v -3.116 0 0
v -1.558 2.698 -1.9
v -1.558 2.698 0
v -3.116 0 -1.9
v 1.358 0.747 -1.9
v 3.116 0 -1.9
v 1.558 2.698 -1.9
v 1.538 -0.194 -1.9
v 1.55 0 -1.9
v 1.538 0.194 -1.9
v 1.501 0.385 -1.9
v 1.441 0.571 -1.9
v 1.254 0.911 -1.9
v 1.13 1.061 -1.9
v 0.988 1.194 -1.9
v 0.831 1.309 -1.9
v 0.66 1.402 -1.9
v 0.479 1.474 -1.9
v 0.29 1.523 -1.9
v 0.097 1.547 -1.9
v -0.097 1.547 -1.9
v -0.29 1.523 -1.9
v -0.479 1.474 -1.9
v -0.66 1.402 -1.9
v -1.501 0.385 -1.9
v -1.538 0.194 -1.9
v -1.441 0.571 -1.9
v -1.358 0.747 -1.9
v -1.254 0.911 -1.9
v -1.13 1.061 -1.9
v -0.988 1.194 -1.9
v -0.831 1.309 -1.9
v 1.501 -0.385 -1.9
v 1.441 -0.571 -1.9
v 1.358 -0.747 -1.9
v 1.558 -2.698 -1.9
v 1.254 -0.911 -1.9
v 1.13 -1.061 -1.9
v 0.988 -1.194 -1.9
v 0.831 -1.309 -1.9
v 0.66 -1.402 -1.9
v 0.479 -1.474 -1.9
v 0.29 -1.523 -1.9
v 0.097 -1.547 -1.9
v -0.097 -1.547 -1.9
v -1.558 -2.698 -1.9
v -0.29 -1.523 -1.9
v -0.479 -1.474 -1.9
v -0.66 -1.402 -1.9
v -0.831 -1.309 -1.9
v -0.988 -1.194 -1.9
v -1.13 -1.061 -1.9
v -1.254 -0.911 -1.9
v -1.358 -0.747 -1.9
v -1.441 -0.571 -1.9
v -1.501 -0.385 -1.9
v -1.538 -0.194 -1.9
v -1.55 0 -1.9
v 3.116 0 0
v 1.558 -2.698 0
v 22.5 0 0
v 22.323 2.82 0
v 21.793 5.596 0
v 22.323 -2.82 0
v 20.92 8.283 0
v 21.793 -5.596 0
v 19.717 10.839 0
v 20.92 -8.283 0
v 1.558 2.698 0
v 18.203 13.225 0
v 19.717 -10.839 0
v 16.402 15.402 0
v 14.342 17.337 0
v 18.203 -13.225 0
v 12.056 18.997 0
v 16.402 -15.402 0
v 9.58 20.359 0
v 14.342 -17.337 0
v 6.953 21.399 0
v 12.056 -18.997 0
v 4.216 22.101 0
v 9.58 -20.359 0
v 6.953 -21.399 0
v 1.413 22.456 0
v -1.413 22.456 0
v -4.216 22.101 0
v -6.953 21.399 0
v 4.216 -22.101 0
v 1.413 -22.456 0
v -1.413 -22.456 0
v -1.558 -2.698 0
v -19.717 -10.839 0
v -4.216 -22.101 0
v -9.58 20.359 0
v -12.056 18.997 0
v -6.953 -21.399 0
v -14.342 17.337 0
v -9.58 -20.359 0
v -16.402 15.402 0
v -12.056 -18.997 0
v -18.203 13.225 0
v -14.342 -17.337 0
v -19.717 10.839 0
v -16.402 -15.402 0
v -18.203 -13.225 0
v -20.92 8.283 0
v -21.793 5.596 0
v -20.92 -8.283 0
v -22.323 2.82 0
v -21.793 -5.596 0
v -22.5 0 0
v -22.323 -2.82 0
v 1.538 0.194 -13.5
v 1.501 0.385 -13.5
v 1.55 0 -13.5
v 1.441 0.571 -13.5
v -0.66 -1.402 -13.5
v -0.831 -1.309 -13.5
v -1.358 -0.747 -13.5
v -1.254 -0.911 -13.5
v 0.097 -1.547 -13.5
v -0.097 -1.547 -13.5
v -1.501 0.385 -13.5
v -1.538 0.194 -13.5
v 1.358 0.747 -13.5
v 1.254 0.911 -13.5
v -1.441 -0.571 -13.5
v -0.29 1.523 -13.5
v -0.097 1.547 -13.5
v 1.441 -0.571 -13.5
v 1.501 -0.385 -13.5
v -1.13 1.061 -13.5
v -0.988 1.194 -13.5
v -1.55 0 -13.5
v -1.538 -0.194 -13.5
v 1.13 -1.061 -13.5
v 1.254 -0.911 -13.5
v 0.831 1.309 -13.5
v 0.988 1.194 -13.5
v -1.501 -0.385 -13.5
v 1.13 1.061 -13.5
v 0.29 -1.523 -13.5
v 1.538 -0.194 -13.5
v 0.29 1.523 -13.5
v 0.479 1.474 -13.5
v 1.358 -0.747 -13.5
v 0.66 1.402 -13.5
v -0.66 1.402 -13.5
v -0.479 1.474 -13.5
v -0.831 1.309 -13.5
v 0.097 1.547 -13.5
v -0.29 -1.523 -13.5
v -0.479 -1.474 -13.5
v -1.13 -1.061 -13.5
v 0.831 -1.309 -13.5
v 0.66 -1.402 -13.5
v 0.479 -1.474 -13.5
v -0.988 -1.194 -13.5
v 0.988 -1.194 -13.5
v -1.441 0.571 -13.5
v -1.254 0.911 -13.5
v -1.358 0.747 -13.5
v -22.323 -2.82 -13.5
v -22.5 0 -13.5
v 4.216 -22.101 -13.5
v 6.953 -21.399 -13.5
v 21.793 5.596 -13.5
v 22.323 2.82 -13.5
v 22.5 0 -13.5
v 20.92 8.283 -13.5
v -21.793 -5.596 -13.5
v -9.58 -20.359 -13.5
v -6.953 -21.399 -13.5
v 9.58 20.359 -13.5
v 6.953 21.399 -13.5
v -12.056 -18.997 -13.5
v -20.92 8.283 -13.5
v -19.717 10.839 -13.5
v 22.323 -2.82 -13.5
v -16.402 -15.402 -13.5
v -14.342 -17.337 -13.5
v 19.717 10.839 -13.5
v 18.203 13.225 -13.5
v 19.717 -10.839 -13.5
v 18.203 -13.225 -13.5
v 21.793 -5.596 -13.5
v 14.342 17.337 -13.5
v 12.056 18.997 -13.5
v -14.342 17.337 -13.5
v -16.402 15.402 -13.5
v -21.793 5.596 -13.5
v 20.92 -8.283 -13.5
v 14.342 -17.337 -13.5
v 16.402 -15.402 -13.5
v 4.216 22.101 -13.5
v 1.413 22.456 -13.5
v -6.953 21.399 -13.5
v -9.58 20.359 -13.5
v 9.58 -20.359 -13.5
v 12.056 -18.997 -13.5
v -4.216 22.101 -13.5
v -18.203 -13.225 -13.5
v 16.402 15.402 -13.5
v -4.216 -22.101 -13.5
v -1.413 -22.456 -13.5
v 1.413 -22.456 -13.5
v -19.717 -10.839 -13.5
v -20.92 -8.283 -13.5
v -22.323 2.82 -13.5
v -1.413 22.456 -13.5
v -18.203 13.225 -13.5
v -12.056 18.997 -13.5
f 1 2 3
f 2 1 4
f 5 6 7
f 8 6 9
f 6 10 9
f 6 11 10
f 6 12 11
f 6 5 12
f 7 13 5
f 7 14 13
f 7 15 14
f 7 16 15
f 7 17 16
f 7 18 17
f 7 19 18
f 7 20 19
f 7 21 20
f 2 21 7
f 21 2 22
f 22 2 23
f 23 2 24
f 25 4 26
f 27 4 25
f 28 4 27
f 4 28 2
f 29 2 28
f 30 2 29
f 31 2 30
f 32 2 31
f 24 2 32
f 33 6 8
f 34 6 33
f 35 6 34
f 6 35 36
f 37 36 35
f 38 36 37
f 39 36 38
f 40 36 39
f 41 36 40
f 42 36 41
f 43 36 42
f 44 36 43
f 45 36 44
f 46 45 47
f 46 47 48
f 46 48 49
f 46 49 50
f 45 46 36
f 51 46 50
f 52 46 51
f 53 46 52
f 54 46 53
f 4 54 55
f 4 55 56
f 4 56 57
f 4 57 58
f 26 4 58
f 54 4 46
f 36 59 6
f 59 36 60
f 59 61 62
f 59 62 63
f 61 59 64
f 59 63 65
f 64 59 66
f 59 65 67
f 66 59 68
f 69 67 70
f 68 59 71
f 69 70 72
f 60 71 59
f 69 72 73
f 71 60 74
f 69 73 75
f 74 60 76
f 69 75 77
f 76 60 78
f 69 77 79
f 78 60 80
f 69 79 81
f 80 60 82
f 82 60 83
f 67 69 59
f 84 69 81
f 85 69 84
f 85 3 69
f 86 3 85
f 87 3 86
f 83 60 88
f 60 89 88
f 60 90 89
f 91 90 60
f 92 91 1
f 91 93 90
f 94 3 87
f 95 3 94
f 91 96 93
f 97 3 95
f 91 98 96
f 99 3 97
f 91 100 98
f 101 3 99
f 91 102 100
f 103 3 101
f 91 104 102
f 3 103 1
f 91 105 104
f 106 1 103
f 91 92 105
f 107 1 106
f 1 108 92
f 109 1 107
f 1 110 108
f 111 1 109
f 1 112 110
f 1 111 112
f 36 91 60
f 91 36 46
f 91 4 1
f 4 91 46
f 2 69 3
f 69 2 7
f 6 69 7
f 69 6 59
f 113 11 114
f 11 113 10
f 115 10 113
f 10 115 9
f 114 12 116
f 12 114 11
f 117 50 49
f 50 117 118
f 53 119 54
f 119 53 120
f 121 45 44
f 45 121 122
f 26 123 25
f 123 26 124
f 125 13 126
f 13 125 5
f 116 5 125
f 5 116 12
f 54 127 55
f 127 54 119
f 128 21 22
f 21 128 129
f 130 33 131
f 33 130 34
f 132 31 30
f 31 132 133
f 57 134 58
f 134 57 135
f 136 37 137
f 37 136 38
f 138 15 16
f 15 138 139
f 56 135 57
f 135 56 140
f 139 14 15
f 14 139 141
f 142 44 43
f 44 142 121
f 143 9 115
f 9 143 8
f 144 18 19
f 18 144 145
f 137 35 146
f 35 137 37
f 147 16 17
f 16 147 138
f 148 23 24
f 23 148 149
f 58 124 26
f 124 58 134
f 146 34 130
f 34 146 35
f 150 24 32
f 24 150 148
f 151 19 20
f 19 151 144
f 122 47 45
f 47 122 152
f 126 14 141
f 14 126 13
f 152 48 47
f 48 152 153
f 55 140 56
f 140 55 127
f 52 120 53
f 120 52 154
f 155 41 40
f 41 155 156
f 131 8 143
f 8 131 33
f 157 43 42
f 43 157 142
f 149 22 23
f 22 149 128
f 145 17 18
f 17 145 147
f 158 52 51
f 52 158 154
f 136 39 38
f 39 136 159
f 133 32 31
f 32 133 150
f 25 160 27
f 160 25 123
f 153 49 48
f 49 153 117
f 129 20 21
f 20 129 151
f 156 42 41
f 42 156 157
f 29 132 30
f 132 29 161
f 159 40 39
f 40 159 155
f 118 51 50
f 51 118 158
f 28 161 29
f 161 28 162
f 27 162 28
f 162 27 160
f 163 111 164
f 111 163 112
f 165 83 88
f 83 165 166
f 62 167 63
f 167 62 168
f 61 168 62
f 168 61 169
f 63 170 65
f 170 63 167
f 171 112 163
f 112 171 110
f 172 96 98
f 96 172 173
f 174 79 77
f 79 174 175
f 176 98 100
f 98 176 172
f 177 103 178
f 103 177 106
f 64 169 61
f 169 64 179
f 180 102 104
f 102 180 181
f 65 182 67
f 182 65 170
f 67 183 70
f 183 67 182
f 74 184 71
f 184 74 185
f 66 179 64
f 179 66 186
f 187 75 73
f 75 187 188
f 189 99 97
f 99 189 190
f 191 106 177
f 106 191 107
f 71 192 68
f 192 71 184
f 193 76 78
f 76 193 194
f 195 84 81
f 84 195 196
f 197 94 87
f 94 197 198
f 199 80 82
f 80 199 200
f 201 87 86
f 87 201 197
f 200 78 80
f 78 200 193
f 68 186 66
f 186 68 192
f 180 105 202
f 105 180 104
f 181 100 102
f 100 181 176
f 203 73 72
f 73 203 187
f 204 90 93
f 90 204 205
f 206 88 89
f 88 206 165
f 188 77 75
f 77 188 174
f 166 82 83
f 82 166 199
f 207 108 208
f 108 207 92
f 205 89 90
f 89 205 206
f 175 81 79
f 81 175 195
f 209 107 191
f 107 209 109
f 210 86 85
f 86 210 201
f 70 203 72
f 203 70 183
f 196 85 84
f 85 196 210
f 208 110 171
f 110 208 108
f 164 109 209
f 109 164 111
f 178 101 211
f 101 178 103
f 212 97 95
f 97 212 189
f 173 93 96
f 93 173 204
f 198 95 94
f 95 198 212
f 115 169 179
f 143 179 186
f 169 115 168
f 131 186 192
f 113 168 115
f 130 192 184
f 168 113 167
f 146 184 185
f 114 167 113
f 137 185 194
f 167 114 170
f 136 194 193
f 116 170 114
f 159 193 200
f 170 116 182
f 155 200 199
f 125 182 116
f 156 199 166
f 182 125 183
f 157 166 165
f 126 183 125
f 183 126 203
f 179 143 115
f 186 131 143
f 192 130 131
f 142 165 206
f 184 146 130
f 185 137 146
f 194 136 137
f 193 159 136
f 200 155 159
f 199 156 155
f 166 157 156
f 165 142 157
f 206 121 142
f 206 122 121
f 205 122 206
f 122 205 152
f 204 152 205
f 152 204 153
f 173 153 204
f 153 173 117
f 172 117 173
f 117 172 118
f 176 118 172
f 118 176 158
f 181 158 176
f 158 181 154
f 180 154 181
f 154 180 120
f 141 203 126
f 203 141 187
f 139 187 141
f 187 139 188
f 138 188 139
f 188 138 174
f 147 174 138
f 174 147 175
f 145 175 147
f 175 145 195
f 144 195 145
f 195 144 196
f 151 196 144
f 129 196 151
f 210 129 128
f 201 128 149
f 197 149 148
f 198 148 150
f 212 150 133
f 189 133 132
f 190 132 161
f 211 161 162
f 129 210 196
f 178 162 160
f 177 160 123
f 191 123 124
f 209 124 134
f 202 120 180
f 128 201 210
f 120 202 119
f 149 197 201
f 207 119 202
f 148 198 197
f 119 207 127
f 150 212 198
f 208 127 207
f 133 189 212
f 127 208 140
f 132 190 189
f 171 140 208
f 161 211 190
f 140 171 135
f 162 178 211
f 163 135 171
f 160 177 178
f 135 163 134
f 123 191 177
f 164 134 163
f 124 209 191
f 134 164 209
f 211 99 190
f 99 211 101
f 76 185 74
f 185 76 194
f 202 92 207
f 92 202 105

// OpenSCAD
$fn = 50;

difference() {
	union() {
		translate(v = [0, 0, -13.5]) {
			cylinder(h = 13.5, r = 22.5);
		}
	}
	union() {
		translate(v = [0, 0, 0]) {
			rotate(a = [0, 0, 0]) {
				difference() {
					union() {
						translate(v = [0, 0, -1.9]) {
							linear_extrude(height = 1.9) {
								polygon(points = [[3.1158, 0.0], [1.5579000000000005, 2.698361953111554], [-1.5578999999999994, 2.6983619531115544], [-3.1158, 3.815754496783323e-16], [-1.5579000000000014, -2.6983619531115535], [1.557899999999998, -2.6983619531115552]]);
							}
						}
					}
					union();
				}
			}
		}
		#translate(v = [0, 0, -100.0]) {
			cylinder(h = 200, r = 1.55);
		}
	}
}
